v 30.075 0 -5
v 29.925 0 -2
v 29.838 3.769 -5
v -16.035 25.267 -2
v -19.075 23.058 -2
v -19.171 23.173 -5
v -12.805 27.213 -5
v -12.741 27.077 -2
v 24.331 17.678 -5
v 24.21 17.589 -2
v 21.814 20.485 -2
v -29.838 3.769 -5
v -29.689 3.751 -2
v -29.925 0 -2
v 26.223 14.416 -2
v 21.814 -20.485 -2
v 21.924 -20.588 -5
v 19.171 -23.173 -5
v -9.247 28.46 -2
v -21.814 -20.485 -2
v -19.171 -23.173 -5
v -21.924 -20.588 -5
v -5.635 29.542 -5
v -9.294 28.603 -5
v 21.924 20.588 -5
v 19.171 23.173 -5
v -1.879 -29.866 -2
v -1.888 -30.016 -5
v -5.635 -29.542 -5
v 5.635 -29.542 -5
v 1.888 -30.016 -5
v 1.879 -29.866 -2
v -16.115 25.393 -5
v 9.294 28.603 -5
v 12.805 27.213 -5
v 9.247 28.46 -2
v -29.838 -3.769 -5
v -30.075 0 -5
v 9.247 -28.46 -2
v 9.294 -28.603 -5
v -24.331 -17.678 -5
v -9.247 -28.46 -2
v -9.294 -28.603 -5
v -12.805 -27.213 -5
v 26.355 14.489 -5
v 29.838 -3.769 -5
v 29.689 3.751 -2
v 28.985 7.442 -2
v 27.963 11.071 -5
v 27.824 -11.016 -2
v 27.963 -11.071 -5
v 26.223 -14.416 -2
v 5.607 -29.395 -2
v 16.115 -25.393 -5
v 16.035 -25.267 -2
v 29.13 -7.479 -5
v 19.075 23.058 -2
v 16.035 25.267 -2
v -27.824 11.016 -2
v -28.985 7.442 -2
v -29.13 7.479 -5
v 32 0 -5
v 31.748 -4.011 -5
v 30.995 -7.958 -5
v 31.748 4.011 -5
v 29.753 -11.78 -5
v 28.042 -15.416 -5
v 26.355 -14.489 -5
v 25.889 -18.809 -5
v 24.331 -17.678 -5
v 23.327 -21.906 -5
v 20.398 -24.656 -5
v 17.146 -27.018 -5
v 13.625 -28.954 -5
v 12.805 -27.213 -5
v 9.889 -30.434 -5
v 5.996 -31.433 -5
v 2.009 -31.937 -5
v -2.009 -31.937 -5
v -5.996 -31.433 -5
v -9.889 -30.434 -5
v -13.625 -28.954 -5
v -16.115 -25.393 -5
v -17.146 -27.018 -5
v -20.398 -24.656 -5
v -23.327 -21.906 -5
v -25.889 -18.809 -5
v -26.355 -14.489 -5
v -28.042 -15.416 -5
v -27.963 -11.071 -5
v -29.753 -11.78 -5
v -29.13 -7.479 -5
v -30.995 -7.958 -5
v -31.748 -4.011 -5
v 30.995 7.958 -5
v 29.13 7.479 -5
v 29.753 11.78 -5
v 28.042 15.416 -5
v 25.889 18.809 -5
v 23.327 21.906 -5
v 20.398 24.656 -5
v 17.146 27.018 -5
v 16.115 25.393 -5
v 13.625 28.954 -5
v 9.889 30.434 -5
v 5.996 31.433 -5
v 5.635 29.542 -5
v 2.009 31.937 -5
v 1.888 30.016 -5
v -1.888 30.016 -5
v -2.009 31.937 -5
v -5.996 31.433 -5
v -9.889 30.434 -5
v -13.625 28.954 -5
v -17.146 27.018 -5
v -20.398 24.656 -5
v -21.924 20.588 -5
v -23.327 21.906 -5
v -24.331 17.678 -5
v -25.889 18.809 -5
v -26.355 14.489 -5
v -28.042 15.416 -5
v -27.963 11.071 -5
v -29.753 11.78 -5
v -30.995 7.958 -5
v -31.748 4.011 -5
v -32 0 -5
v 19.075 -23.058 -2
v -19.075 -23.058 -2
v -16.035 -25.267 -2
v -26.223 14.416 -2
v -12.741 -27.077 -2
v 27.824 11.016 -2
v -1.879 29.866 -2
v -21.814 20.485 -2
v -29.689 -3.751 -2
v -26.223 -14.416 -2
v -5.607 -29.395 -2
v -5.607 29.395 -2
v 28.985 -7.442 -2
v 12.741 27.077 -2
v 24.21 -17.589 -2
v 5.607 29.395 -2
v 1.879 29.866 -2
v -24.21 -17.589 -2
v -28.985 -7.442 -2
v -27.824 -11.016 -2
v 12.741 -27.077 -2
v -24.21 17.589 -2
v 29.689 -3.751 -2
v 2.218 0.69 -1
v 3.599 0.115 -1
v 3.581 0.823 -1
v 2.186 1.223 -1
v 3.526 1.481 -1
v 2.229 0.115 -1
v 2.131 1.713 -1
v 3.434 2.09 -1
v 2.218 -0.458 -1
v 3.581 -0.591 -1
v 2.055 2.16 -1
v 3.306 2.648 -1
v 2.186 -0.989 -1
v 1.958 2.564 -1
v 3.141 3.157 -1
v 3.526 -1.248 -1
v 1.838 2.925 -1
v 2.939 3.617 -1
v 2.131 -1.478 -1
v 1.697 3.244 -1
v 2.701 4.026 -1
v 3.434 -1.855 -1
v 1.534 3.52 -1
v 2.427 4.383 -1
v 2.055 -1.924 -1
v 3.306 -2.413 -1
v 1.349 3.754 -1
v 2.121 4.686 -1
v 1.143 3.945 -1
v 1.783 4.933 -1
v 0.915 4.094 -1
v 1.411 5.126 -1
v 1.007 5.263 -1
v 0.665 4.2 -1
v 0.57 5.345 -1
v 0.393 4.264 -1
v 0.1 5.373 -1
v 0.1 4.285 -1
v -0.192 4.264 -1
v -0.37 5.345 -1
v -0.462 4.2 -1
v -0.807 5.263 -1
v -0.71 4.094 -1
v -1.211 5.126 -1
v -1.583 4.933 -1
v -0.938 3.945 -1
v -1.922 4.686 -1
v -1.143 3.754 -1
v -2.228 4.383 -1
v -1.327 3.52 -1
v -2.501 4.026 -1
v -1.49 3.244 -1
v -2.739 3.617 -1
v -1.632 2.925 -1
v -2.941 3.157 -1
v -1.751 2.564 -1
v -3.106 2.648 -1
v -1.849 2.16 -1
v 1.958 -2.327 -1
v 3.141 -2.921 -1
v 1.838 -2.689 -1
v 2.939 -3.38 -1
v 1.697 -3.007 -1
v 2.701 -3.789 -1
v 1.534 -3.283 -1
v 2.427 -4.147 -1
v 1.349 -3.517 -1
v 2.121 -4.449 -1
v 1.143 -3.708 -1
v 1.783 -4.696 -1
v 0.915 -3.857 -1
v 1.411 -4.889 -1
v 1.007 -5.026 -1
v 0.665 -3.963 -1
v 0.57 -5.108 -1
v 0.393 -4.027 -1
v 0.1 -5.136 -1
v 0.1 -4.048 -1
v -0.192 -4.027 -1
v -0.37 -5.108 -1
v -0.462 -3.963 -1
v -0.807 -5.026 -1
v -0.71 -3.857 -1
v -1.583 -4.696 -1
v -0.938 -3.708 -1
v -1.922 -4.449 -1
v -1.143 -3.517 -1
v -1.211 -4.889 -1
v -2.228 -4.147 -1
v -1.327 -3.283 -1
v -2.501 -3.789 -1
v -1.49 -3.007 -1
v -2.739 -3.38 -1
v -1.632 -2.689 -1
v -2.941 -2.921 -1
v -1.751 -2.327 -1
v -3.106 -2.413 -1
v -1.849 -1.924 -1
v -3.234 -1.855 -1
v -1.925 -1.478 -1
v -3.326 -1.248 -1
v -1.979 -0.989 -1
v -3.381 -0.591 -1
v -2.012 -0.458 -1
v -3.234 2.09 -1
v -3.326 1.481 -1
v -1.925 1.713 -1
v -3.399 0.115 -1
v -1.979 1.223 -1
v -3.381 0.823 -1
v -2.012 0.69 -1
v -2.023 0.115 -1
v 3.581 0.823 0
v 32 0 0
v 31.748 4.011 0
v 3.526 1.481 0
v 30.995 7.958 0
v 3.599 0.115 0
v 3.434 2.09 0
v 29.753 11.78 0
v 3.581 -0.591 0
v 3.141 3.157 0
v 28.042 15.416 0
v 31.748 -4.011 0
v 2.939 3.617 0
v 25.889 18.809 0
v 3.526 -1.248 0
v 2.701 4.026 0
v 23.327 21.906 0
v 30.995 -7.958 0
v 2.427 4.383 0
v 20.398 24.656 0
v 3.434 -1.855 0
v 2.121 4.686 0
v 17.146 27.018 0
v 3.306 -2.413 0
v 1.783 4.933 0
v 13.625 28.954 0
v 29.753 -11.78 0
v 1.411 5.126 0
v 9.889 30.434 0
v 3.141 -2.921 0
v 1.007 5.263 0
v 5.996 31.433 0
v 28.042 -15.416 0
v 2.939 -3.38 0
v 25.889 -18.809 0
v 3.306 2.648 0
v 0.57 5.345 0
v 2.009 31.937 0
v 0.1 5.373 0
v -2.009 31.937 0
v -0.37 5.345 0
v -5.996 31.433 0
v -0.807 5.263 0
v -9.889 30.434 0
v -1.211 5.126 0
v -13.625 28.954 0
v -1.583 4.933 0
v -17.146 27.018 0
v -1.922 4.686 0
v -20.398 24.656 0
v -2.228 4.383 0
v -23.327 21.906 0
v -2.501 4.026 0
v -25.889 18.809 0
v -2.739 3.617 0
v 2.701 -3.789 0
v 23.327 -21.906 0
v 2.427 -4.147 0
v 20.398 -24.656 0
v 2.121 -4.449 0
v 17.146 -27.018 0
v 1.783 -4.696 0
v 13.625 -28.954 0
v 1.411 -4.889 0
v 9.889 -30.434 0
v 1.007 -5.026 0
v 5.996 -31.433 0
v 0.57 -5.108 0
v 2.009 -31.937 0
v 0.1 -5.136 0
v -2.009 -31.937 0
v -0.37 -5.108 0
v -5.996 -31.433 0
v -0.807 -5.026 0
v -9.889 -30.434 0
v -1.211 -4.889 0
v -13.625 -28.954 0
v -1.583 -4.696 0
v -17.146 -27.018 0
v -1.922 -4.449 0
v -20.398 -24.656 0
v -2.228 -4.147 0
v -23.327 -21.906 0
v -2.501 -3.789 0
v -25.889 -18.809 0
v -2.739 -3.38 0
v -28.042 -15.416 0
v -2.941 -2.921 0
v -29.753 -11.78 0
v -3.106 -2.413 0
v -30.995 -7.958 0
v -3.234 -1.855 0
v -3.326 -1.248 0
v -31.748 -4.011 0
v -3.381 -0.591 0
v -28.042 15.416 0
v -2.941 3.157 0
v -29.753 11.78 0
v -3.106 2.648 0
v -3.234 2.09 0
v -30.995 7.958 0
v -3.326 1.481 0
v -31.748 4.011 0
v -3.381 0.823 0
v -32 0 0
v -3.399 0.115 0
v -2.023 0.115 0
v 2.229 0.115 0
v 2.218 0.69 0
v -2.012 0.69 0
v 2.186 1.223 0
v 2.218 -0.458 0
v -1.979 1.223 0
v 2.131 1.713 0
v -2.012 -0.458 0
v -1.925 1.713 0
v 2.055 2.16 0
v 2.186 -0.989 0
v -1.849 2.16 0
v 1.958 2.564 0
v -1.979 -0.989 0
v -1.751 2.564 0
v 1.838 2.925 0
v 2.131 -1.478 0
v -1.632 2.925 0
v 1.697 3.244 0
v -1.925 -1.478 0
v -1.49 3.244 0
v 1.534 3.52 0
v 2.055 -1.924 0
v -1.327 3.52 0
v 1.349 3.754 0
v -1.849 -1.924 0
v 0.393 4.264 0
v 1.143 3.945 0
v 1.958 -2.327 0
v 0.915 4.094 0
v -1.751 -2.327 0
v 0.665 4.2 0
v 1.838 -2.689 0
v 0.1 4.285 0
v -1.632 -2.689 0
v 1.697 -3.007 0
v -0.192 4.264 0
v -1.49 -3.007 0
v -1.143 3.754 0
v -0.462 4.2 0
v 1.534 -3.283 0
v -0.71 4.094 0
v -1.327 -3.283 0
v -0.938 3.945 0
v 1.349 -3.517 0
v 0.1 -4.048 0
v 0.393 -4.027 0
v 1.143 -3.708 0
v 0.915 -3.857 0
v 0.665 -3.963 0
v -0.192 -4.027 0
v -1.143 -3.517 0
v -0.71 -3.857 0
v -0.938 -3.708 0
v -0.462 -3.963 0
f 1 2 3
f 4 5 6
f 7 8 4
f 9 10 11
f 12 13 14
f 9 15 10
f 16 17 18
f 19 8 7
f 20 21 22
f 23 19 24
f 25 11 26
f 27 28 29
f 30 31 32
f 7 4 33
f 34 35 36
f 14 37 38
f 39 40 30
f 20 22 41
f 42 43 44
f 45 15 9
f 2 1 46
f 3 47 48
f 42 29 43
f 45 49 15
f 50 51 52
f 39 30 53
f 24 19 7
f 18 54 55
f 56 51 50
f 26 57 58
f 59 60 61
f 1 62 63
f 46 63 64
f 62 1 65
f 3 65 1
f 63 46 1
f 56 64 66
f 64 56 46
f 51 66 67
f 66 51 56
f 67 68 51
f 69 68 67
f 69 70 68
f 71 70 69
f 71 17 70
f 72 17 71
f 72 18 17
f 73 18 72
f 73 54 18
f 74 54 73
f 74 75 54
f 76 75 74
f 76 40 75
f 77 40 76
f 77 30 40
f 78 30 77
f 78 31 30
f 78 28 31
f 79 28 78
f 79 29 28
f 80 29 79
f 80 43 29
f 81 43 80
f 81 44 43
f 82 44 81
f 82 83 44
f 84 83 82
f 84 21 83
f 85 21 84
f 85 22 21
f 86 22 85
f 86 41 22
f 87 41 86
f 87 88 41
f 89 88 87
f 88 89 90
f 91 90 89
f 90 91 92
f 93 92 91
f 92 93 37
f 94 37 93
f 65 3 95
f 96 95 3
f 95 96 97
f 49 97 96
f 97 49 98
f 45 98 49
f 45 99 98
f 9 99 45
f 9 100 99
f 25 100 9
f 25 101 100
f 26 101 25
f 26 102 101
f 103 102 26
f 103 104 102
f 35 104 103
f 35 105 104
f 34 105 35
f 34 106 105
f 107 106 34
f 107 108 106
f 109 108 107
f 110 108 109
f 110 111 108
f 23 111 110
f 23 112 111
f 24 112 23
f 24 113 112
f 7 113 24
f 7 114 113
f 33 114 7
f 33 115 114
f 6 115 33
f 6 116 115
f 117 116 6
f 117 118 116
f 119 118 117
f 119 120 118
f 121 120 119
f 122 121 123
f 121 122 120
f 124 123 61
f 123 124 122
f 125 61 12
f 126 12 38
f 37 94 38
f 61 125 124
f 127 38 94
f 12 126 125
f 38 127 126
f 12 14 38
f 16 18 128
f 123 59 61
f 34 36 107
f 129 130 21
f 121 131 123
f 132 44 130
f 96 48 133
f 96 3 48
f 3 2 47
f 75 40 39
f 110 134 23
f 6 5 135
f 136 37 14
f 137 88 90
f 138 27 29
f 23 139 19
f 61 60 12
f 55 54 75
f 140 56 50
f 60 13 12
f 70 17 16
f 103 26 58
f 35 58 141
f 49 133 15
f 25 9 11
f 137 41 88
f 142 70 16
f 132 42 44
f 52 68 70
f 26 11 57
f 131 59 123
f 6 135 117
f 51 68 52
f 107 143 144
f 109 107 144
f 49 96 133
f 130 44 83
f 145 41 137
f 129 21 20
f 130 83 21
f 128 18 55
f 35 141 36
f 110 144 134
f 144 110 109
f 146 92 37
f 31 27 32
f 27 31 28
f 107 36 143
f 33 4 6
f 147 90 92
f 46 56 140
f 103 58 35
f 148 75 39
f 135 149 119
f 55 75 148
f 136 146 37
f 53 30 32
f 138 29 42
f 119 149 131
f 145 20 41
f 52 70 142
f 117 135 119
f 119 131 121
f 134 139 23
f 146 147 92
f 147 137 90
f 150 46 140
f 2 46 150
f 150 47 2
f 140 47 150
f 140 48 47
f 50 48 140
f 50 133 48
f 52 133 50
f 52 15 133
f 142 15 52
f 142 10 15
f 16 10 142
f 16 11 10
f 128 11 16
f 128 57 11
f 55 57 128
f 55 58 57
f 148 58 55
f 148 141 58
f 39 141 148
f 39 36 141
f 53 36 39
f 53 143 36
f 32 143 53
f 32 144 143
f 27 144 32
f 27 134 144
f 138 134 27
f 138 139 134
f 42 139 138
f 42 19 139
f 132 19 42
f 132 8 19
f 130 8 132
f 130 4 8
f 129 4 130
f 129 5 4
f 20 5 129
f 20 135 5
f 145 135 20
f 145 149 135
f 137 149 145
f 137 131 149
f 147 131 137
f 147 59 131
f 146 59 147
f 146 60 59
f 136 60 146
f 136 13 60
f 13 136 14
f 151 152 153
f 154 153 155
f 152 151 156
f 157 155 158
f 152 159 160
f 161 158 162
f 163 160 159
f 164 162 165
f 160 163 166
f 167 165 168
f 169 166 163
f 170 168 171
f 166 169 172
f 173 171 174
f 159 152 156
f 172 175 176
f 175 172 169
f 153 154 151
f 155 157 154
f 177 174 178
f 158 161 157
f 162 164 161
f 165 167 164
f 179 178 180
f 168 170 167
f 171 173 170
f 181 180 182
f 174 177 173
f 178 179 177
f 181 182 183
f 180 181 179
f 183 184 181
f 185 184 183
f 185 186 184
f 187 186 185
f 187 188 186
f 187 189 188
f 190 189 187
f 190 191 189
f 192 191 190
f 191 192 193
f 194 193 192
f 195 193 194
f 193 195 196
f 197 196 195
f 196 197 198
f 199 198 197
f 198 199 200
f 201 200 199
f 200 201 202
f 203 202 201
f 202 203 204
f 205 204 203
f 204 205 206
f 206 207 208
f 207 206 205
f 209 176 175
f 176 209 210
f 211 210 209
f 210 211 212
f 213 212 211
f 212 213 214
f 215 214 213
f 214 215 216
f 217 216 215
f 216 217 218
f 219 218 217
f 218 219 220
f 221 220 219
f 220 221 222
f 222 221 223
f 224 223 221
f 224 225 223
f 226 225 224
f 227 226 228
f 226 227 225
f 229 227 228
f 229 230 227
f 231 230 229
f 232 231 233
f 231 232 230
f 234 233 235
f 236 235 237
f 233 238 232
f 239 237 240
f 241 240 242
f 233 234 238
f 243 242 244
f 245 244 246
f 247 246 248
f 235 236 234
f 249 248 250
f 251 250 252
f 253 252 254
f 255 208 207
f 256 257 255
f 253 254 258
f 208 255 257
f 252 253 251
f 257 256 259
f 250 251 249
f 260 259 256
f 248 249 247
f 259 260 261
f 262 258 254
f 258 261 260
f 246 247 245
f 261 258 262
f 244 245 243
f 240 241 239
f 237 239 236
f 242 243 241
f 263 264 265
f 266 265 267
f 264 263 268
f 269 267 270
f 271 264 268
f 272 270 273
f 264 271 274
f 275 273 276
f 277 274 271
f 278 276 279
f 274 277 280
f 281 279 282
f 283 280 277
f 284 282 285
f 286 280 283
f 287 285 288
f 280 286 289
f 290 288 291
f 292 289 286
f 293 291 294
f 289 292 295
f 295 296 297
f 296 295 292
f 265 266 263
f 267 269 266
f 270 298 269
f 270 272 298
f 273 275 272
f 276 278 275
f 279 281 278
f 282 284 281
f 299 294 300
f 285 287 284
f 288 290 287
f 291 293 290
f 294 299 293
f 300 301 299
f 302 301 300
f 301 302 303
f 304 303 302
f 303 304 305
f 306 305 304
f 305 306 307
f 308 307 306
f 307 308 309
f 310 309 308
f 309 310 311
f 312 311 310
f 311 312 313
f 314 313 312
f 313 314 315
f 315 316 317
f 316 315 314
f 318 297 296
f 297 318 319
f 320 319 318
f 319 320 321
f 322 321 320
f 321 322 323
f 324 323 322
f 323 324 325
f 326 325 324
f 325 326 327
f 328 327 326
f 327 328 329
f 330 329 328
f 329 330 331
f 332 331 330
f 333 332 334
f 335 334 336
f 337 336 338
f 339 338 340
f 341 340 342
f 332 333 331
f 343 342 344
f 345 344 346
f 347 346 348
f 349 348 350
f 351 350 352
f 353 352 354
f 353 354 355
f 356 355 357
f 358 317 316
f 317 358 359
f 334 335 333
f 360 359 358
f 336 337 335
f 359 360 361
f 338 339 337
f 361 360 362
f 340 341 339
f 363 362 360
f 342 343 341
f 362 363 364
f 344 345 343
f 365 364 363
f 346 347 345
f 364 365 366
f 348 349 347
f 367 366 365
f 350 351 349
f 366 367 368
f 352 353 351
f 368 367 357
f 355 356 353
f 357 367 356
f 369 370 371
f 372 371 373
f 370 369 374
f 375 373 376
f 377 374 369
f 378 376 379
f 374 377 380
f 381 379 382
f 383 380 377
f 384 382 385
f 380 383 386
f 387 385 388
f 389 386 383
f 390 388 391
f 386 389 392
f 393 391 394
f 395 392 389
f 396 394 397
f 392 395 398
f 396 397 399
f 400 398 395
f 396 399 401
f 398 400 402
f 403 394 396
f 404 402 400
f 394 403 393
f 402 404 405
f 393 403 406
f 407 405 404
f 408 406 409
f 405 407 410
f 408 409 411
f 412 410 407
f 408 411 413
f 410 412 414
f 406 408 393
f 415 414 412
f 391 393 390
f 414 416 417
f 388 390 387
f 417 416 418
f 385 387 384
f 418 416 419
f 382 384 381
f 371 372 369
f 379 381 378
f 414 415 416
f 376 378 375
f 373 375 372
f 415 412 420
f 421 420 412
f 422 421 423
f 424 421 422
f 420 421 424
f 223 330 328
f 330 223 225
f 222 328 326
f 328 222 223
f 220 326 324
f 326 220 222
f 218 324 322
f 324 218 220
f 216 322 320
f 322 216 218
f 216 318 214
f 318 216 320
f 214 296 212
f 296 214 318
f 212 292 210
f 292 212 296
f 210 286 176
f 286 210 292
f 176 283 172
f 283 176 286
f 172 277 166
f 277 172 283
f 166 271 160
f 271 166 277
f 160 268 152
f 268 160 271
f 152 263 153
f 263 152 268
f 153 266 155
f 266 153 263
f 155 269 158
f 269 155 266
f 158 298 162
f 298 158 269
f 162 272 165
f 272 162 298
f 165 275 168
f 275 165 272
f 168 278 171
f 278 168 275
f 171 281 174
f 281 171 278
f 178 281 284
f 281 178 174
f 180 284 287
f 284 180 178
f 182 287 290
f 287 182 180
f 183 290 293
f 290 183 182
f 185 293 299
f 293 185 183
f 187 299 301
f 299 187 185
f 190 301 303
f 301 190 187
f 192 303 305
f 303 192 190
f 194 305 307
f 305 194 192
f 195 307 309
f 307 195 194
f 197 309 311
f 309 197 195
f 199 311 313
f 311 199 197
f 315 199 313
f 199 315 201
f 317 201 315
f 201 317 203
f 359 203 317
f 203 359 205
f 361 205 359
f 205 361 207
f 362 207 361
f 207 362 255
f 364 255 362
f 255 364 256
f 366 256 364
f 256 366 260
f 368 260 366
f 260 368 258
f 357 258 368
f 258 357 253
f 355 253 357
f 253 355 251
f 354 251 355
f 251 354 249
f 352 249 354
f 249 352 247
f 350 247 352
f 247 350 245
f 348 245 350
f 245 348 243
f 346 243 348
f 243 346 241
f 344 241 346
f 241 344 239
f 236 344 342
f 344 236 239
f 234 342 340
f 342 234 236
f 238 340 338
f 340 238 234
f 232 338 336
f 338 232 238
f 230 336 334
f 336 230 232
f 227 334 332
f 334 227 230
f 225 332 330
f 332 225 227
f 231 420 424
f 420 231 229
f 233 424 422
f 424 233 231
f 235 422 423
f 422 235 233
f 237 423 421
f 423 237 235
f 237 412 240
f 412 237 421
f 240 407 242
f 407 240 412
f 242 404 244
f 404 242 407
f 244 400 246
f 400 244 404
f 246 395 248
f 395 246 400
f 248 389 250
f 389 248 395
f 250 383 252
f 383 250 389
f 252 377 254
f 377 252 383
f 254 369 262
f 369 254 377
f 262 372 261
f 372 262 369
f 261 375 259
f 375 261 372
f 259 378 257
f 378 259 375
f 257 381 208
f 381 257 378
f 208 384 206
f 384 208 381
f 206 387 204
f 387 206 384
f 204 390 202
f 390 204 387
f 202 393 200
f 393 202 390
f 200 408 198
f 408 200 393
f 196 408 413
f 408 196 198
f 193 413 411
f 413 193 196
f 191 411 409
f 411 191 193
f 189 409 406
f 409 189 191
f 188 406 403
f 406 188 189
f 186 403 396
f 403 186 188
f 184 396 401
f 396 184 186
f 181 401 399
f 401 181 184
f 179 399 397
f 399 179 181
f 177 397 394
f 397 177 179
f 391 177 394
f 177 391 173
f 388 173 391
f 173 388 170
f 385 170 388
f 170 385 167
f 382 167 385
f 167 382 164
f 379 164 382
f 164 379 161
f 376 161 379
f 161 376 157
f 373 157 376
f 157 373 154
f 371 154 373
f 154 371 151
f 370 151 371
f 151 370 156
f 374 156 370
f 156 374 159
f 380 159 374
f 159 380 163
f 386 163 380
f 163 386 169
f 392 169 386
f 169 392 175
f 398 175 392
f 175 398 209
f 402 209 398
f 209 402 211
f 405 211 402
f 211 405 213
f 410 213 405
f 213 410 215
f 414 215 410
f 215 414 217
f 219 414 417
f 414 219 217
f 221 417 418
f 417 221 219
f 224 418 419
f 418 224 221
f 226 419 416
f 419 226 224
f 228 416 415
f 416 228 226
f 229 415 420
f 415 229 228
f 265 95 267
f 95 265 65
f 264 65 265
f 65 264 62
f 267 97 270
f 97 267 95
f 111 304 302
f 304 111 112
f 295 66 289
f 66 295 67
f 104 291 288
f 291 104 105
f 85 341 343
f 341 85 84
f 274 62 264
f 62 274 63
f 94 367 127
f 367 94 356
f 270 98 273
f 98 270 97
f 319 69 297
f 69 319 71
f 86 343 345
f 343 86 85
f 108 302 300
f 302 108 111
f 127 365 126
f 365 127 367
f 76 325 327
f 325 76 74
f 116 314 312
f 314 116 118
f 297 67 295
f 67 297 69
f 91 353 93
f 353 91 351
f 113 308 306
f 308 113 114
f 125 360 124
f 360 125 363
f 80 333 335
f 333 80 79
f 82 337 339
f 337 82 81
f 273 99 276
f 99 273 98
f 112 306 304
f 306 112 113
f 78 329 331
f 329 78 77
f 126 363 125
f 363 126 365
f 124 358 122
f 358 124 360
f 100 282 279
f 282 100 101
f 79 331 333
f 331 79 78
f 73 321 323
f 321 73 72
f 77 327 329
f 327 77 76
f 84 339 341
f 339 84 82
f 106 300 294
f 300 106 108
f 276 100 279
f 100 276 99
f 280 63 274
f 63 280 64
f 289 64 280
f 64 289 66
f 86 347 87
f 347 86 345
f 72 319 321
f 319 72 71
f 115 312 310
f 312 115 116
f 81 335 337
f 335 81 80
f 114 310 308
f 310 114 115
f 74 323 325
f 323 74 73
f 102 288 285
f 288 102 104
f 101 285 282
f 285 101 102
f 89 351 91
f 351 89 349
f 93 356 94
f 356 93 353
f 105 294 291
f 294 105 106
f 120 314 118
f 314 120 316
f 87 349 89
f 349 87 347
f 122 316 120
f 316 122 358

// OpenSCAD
$fn = 50;

difference() {
	union() {
		translate(v = [0, 0, -5.0]) {
			cylinder(h = 5, r = 32.0);
		}
	}
	union() {
		#translate(v = [0, 0, -5.0]) {
			cylinder(h = 3, r1 = 30.075, r2 = 29.925);
		}
		translate(v = [0, 0, -1]) {
			linear_extrude(height = 1) {
				text(font = "Impact", halign = "center", size = 10, text = "0", valign = "center");
			}
		}
	}
}
